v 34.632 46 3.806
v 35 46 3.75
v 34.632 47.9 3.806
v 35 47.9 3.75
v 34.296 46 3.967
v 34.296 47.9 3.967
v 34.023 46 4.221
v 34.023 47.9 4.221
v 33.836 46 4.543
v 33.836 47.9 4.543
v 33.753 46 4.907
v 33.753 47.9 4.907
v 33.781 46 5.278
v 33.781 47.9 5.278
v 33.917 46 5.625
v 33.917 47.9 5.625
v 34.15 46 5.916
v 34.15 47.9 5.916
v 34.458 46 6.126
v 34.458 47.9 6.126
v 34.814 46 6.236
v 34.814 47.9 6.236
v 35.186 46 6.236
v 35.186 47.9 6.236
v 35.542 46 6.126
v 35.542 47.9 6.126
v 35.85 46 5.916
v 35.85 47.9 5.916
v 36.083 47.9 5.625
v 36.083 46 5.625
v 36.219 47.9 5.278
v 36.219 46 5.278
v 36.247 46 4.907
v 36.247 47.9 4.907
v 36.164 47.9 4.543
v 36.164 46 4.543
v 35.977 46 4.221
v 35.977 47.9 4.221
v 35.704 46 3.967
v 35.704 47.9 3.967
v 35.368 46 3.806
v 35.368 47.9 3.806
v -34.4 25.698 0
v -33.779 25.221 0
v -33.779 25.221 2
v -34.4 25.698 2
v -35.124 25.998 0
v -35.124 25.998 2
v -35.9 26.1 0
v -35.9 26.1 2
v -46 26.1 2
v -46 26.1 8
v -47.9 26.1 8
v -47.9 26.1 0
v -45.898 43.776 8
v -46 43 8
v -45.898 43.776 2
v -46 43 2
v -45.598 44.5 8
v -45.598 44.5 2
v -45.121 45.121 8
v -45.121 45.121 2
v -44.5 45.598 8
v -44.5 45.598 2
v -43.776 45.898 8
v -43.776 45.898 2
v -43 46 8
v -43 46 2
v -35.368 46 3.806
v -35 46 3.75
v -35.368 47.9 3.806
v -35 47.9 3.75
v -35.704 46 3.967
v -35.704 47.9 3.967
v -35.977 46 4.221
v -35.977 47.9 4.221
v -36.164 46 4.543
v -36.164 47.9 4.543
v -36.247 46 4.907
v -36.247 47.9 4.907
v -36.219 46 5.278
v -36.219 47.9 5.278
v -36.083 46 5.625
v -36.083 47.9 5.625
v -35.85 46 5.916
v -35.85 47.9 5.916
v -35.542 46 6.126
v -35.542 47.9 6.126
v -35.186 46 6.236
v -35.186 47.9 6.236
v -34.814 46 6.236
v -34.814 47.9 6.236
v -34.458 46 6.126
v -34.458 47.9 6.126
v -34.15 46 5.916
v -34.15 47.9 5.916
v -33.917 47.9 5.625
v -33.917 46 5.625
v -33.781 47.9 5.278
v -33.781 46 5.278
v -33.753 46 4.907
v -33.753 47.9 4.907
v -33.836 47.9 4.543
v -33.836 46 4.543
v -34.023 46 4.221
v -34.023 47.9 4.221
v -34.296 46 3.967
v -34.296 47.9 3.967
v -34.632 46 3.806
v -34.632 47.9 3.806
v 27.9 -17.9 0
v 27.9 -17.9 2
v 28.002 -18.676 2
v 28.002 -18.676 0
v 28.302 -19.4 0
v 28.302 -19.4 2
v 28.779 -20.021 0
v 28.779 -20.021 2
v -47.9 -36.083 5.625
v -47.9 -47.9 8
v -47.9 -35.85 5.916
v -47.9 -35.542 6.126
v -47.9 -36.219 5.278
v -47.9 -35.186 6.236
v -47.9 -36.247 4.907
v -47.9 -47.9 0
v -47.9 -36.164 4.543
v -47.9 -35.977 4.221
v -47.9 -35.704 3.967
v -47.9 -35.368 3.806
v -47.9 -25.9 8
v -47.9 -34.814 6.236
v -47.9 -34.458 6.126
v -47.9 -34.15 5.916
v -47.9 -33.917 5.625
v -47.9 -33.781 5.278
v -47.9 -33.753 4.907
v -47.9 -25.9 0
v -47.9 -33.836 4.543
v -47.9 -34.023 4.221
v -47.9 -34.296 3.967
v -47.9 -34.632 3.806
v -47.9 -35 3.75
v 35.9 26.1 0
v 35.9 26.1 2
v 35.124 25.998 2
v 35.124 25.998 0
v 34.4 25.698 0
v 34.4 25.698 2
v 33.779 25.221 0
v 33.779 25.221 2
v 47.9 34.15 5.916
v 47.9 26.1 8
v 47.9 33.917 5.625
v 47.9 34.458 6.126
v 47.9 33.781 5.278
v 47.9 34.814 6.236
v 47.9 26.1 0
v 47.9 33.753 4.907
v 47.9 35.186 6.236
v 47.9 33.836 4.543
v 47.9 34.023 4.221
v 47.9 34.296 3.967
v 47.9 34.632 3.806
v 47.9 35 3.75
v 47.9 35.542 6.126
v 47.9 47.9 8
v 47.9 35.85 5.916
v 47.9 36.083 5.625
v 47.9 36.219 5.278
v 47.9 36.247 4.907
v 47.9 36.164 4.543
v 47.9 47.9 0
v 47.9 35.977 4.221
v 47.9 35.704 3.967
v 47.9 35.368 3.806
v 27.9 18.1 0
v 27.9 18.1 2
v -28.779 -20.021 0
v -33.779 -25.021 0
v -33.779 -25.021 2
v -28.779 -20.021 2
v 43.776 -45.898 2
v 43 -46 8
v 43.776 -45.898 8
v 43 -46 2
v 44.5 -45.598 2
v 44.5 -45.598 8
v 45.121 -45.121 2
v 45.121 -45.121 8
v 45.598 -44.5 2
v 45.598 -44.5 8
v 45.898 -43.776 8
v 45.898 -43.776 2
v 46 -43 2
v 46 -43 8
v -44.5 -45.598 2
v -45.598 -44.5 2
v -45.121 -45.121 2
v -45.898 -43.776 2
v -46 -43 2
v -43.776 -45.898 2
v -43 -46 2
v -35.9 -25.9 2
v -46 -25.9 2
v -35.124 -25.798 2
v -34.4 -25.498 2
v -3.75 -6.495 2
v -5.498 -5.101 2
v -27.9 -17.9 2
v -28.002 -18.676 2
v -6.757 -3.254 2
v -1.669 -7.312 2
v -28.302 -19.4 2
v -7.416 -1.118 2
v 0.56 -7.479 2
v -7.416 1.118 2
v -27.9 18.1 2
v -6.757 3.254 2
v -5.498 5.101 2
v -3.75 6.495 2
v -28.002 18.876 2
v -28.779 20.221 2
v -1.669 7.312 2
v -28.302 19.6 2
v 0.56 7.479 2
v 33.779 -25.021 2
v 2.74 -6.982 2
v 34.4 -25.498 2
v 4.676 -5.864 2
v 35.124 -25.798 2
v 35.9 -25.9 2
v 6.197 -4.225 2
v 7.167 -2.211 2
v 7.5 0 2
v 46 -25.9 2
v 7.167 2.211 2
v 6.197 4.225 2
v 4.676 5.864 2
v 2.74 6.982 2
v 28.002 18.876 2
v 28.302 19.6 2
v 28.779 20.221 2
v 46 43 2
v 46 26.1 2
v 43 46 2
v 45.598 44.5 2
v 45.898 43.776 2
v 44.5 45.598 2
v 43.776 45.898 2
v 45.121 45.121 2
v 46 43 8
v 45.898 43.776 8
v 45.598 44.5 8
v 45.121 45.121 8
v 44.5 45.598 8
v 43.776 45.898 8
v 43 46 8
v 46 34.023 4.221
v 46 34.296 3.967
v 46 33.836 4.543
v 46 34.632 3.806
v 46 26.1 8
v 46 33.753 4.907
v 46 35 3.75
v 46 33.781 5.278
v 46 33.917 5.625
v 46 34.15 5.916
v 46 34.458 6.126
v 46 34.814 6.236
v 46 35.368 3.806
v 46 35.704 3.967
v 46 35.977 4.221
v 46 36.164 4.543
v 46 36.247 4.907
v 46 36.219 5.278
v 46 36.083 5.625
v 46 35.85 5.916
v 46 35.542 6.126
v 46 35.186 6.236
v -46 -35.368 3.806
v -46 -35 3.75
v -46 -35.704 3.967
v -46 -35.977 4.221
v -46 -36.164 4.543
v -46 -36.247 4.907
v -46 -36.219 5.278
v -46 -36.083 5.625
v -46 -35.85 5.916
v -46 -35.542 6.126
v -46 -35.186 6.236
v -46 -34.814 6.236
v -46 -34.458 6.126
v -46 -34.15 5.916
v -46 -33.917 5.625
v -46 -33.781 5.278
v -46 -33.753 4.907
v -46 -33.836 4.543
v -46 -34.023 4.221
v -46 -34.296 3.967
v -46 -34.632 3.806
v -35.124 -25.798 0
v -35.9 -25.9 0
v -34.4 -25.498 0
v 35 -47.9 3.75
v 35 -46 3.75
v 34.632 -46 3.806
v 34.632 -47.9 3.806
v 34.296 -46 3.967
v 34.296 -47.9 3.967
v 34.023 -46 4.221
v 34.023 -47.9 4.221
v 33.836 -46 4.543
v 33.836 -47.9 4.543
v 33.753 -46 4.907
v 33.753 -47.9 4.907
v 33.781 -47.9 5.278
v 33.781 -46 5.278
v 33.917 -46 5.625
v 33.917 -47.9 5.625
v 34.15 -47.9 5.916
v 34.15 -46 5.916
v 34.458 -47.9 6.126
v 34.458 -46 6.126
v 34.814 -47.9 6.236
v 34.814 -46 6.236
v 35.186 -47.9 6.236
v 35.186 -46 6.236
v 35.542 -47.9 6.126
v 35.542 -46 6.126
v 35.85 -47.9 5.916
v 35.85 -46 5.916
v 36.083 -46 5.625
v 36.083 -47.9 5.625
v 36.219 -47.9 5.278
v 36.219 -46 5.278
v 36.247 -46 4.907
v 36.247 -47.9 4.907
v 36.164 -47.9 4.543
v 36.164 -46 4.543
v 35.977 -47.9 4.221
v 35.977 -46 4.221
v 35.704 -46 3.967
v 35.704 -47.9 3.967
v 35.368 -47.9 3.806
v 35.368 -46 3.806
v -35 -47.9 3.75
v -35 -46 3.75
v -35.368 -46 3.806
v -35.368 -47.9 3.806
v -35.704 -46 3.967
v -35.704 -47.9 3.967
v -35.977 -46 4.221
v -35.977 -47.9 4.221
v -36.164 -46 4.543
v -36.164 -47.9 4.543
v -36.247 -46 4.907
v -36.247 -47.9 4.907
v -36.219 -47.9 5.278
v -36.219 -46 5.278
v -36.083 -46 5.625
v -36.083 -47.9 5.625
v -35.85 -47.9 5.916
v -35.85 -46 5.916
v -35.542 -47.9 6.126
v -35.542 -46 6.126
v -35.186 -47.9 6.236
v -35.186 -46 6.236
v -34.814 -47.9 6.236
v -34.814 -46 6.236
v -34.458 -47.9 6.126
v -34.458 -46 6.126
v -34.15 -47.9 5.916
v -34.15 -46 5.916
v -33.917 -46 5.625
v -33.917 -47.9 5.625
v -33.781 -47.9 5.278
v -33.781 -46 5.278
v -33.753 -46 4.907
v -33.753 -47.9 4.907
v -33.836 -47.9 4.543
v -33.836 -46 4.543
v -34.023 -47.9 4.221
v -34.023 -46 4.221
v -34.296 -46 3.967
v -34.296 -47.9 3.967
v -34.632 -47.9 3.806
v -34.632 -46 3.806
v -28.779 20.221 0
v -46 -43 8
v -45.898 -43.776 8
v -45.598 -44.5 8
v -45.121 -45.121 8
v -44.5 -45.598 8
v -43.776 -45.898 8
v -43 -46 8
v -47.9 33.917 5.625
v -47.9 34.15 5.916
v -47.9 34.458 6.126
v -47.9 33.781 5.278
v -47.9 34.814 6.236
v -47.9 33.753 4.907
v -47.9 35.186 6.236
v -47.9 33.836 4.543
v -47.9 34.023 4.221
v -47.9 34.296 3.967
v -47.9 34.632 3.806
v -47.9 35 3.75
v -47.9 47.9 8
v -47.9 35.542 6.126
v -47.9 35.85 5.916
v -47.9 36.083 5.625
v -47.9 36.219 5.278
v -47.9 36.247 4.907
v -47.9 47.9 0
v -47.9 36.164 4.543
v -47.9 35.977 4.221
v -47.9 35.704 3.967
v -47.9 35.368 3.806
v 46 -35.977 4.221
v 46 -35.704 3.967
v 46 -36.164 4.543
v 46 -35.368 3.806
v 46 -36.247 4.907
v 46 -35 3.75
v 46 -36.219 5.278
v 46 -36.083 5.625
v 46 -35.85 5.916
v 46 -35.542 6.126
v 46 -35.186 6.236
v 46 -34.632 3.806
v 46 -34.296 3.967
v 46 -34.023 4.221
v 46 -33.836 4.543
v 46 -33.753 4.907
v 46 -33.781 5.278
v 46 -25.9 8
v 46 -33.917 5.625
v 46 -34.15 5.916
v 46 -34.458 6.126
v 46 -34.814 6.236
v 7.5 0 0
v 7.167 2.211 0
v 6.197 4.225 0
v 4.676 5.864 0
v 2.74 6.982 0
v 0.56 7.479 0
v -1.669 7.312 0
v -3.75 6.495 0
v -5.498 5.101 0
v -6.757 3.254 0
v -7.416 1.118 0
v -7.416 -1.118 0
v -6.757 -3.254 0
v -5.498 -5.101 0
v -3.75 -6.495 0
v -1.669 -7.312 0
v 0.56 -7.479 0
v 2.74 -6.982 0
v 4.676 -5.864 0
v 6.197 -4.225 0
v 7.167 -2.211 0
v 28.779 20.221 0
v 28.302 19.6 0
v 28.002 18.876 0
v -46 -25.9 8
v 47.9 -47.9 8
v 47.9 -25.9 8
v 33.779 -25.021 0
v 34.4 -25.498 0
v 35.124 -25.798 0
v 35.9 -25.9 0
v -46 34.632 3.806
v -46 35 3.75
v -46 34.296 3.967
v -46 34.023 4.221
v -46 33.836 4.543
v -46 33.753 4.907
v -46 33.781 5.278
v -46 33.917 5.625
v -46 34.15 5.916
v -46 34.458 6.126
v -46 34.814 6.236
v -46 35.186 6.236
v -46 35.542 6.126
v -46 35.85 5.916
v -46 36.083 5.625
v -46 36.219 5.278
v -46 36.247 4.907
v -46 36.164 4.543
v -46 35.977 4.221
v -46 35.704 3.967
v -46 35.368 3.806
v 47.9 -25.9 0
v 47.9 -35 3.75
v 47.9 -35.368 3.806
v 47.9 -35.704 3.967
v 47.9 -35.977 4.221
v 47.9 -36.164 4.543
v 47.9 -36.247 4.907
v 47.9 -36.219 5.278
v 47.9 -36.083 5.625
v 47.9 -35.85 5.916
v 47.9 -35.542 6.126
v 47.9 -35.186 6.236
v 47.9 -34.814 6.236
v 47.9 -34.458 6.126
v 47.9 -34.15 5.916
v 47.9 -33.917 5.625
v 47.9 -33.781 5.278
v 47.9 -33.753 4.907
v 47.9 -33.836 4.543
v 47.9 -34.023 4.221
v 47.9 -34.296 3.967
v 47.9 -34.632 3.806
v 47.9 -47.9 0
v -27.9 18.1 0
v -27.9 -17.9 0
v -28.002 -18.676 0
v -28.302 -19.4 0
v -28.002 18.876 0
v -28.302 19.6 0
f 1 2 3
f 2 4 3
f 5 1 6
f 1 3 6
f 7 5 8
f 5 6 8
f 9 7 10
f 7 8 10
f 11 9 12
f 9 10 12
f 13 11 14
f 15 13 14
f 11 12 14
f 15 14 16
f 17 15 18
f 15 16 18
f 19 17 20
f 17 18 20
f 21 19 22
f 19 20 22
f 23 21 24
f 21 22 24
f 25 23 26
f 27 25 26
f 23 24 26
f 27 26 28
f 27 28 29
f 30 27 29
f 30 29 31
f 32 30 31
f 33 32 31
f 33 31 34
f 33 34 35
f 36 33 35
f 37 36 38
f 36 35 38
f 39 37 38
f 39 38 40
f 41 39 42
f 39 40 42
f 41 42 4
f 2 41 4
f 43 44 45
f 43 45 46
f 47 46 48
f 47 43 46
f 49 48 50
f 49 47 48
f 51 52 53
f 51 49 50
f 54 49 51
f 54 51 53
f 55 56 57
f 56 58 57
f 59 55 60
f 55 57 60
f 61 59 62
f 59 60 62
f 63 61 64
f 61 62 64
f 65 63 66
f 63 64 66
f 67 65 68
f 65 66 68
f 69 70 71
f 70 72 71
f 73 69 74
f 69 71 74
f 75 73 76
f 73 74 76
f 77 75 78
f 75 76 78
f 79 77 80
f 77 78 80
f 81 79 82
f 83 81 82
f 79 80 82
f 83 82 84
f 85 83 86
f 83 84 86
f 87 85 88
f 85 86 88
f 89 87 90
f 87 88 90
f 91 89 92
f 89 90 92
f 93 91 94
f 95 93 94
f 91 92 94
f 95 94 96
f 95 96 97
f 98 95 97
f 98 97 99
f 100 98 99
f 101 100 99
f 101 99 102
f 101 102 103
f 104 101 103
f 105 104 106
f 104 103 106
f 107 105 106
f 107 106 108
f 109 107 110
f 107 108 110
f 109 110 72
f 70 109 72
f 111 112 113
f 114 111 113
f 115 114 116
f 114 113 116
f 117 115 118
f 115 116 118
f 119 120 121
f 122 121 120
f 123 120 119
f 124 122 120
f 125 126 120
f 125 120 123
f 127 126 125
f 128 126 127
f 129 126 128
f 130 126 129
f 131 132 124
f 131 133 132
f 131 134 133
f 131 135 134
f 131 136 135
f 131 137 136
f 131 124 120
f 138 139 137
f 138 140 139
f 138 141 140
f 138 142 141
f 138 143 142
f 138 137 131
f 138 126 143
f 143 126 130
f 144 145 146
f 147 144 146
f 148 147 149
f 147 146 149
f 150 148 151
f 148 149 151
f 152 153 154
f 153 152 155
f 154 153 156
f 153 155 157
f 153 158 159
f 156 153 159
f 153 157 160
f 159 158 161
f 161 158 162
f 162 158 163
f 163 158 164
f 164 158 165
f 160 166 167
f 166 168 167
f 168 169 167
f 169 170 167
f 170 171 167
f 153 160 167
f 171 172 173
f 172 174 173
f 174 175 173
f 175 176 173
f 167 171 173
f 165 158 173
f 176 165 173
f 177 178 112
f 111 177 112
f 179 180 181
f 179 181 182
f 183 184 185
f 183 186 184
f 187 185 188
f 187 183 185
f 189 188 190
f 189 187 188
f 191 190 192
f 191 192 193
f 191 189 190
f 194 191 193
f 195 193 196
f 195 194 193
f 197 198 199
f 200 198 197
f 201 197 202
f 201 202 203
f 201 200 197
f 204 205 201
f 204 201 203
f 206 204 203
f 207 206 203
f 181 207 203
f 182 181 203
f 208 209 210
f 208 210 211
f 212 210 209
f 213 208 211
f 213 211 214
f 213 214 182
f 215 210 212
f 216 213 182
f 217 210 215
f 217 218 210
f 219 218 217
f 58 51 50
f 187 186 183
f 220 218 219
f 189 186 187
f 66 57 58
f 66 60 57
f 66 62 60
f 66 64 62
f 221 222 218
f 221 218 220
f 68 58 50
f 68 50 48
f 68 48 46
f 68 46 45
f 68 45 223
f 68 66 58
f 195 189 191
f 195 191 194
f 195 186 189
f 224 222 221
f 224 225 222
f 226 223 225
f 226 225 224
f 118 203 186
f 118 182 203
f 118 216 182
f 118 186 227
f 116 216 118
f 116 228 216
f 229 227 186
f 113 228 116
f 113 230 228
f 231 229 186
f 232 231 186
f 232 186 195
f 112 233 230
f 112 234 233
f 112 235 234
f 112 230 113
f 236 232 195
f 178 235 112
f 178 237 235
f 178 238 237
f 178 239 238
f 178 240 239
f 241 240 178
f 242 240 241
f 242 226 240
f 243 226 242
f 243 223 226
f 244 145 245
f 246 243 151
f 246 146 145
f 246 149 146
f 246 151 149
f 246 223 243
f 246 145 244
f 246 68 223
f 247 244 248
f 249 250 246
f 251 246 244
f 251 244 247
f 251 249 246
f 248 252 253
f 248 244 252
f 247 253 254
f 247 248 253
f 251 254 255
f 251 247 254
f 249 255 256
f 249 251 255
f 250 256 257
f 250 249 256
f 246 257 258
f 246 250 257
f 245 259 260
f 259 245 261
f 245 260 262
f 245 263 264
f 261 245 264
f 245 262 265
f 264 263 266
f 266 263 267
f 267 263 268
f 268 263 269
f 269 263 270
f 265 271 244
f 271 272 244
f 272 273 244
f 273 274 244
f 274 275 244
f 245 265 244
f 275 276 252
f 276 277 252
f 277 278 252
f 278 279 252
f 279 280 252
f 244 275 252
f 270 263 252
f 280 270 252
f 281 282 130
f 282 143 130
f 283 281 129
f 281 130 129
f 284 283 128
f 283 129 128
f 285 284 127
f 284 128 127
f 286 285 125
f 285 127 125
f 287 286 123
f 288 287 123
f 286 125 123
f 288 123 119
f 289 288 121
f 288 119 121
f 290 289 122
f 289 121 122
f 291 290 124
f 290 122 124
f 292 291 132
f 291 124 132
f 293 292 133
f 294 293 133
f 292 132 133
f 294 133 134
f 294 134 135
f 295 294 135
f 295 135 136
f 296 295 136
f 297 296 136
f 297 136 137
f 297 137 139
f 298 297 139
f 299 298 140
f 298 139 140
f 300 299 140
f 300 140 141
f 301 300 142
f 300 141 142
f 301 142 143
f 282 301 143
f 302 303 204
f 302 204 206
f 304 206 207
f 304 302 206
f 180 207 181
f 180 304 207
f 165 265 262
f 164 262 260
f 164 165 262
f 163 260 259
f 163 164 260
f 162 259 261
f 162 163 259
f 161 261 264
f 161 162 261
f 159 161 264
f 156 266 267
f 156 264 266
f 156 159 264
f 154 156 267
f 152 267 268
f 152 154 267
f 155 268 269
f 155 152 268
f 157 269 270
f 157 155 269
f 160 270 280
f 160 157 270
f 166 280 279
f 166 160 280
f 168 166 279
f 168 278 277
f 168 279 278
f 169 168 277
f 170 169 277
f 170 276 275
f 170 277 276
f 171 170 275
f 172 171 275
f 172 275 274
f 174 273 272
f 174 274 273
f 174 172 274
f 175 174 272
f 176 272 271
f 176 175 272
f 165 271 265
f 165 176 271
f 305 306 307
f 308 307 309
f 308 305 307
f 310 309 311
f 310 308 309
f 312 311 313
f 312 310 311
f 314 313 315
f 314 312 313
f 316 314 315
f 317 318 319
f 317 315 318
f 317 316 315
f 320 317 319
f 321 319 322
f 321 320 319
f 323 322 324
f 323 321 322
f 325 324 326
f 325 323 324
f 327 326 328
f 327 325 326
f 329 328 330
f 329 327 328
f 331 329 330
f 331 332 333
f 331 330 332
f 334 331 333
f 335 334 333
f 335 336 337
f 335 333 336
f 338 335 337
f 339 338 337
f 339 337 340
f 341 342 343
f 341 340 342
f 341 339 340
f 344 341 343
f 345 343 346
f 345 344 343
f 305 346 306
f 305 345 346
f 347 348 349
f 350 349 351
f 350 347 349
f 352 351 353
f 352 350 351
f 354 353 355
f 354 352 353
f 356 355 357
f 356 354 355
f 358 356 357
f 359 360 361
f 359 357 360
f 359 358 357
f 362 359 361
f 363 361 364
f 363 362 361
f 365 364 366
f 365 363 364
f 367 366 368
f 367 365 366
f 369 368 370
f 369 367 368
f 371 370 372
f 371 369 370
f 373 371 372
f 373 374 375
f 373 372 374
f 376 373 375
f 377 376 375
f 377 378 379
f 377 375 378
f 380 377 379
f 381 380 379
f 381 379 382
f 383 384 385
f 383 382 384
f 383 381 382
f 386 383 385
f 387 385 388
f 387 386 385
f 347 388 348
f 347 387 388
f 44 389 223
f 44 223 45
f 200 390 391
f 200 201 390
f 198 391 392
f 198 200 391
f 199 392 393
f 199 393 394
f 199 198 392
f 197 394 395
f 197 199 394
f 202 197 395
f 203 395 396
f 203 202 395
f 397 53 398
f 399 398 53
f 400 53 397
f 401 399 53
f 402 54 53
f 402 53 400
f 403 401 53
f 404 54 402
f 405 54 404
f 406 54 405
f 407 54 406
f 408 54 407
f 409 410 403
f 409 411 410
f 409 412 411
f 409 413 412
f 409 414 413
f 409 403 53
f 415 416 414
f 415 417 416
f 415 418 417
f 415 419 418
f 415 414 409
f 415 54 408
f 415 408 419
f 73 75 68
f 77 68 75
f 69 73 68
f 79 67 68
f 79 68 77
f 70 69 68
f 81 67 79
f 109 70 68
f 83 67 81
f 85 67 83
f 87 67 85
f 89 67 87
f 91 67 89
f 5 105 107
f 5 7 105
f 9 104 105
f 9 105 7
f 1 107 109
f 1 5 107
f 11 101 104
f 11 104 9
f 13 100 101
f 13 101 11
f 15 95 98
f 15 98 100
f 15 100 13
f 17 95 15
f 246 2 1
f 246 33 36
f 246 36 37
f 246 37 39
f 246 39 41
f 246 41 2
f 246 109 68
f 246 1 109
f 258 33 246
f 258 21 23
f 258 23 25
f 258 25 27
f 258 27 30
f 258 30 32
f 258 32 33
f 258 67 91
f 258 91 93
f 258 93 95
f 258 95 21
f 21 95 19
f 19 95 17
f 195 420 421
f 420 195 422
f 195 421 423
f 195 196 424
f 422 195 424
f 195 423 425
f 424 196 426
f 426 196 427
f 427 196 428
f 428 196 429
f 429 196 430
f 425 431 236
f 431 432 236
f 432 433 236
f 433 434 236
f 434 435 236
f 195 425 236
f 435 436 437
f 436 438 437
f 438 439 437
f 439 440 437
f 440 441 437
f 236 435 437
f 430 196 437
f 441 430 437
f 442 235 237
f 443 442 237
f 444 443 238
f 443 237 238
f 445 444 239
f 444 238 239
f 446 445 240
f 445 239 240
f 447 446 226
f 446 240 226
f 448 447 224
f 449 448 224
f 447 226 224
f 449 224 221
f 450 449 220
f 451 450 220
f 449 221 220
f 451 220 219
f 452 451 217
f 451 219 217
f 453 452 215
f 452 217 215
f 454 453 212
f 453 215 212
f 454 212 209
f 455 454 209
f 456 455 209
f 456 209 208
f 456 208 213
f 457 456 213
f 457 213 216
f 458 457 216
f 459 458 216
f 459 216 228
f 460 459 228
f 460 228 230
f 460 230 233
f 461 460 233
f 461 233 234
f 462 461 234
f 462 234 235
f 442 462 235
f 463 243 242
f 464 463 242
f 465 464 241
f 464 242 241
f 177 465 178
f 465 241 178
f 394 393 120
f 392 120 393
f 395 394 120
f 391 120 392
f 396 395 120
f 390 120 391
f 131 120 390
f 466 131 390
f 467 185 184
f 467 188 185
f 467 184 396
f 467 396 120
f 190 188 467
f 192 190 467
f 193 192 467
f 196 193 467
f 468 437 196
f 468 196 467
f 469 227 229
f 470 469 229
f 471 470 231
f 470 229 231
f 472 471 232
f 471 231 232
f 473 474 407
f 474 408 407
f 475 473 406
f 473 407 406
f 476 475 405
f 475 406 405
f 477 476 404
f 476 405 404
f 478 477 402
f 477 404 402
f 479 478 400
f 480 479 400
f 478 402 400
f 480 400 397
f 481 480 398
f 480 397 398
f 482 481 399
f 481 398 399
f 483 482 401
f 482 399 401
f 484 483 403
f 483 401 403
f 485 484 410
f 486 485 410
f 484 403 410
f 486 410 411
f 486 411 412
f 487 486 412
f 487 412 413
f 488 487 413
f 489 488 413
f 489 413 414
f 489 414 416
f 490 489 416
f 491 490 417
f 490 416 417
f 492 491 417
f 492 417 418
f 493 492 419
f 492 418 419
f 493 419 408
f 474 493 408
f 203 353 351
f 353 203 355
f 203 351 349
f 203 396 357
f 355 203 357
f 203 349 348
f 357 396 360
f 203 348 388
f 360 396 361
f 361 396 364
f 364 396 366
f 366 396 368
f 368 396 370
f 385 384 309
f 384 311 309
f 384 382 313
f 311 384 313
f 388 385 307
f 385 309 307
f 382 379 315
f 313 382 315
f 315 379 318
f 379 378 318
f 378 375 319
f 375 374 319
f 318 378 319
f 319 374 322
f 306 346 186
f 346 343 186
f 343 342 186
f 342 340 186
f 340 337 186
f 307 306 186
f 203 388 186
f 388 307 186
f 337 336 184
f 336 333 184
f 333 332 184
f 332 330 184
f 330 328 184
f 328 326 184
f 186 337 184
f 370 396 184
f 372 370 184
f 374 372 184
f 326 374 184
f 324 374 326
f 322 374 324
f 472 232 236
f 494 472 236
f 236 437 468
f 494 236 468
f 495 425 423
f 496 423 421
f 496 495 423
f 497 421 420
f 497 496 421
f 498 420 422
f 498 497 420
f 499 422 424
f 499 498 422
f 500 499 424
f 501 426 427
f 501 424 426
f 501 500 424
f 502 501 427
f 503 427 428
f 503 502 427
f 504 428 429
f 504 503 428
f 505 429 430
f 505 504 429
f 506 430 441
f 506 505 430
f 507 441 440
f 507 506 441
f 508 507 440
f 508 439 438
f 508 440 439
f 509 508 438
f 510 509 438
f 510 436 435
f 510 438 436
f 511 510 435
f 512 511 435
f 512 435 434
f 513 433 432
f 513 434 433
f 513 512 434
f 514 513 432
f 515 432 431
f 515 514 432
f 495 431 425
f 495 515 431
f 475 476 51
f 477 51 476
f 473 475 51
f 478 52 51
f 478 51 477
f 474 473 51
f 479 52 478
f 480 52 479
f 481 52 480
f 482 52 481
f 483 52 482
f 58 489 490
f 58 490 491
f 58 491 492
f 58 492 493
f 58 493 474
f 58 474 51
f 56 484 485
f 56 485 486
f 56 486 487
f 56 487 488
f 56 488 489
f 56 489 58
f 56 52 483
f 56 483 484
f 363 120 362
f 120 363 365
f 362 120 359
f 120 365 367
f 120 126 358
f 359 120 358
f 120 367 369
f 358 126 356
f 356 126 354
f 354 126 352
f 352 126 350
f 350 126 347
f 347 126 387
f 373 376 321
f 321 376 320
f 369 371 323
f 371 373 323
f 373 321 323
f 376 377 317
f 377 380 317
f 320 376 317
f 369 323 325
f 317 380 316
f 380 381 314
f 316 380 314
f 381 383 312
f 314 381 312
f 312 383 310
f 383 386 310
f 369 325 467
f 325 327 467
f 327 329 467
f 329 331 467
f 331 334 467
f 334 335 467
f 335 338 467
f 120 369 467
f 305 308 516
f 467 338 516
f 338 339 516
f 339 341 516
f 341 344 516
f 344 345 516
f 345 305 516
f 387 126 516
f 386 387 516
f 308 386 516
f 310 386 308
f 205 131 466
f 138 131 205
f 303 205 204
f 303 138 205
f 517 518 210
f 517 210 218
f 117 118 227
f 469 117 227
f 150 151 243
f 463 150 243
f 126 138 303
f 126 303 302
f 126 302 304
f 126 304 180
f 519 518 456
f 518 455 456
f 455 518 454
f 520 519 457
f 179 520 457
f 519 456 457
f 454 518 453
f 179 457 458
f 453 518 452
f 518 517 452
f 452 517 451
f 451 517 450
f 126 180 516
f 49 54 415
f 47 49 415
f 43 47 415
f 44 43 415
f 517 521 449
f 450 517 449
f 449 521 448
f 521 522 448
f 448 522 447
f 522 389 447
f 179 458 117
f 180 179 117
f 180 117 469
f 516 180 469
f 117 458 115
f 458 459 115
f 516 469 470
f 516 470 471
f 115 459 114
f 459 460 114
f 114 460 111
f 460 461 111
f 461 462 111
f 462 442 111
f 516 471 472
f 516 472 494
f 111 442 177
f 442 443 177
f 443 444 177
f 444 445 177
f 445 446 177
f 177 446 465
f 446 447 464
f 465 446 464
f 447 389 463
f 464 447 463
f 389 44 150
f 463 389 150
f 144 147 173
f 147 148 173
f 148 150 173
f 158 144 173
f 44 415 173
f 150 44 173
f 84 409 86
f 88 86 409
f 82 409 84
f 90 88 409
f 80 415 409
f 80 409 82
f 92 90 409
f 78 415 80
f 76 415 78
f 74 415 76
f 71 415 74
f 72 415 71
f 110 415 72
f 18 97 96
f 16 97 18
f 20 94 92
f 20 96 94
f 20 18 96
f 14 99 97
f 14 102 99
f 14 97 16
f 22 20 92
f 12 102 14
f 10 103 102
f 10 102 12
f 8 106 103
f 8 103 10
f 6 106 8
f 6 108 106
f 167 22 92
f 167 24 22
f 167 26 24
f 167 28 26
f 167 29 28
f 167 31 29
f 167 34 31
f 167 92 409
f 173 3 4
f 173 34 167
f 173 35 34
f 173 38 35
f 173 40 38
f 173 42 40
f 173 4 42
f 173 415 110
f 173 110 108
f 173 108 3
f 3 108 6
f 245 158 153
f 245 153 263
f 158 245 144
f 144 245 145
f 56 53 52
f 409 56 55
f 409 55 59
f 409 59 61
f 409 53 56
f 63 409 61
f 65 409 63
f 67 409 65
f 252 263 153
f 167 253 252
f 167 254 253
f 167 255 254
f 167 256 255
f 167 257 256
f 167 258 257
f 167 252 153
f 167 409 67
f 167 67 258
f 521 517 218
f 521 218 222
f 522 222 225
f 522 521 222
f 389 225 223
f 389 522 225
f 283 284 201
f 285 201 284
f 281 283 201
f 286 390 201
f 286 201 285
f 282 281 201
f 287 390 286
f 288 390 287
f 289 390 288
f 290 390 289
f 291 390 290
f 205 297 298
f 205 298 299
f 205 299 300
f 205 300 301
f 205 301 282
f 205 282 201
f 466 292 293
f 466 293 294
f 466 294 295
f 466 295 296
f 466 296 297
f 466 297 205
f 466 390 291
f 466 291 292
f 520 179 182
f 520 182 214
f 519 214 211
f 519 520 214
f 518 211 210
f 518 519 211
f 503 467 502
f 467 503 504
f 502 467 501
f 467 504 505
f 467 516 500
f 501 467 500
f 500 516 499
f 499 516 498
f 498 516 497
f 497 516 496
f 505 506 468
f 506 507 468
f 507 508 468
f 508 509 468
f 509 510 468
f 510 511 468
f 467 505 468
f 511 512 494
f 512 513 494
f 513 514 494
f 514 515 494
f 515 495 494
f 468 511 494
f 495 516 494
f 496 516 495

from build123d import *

# Parameters (mm, degrees)
SKETCH1_W                      = 95.8
SKETCH1_H                      = 95.8
BOSS_EXTRUDE1_DEPTH            = 8
SKETCH2_W                      = 92
SKETCH2_H                      = 92
COMPONENT_PLATFORM_DEPTH       = 6
CABLE_SLOTS_DEPTH              = 6
SKETCH4_R                      = 7.5
CENTER_MASS_CUT_DEPTH          = 6
INNER_CORNER_FILLETS_R         = 3
M3X0_5_TAPPED_HOLE1_AT_2_COUNT = 2
M3X0_5_TAPPED_HOLE1_AT_2_PITCH = 70
M3X0_5_TAPPED_HOLE2_AT_2_COUNT = 2
M3X0_5_TAPPED_HOLE2_AT_2_PITCH = 70


with BuildPart() as part:
    # Sketch1 → Boss-Extrude1 (new body)
    with BuildSketch(Plane.XY):
        Rectangle(SKETCH1_W, SKETCH1_H)
    extrude(amount=BOSS_EXTRUDE1_DEPTH)

    # Sketch2 → Component Platform (cut)
    with BuildSketch(Plane.XY.offset(8)):
        Rectangle(SKETCH2_W, SKETCH2_H)
    extrude(amount=-COMPONENT_PLATFORM_DEPTH, mode=Mode.SUBTRACT)

    # Sketch3 → Cable Slots (cut, symmetric)
    with BuildSketch(Plane.XY.offset(2)):
        with BuildLine():
            Line((-33.778679656, -25.021320344), (-28.778679656, -20.021320344))
            ThreePointArc((-28.778679656, -20.021320344), (-28.128361402, -19.048050297), (-27.9, -17.9))
            Line((-27.9, -17.9), (-27.9, 18.1))
            ThreePointArc((-27.9, 18.1), (-28.128361402, 19.248050297), (-28.778679656, 20.221320344))
            Line((-28.778679656, 20.221320344), (-33.778679656, 25.221320344))
            ThreePointArc((-33.778679656, 25.221320344), (-34.751949703, 25.871638598), (-35.9, 26.1))
            Line((-35.9, 26.1), (-47.9, 26.1))
            Line((-47.9, 26.1), (-47.9, -25.9))
            Line((-47.9, -25.9), (-35.9, -25.9))
            ThreePointArc((-35.9, -25.9), (-34.751949703, -25.671638598), (-33.778679656, -25.021320344))
        make_face()
        with BuildLine():
            Line((47.9, -25.9), (47.9, 26.1))
            Line((47.9, 26.1), (35.9, 26.1))
            ThreePointArc((35.9, 26.1), (34.751949703, 25.871638598), (33.778679656, 25.221320344))
            Line((33.778679656, 25.221320344), (28.778679656, 20.221320344))
            ThreePointArc((28.778679656, 20.221320344), (28.128361402, 19.248050297), (27.9, 18.1))
            Line((27.9, 18.1), (27.9, -17.9))
            ThreePointArc((27.9, -17.9), (28.128361402, -19.048050297), (28.778679656, -20.021320344))
            Line((28.778679656, -20.021320344), (33.778679656, -25.021320344))
            ThreePointArc((33.778679656, -25.021320344), (34.751949703, -25.671638598), (35.9, -25.9))
            Line((35.9, -25.9), (47.9, -25.9))
        make_face()
    extrude(amount=CABLE_SLOTS_DEPTH, both=True, mode=Mode.SUBTRACT)

    # Sketch4 → Center Mass Cut (cut)
    with BuildSketch(Plane.XY.offset(2)):
        Circle(SKETCH4_R)
    extrude(amount=-CENTER_MASS_CUT_DEPTH, mode=Mode.SUBTRACT)

    # Inner Corner Fillets
    inner_corner_fillets_edges = [part.edges().sort_by_distance(p)[0] for p in [
        (-46, -46, 5),
        (-46, 46, 5),
        (46, 46, 5),
        (46, -46, 5),
    ]]
    fillet(inner_corner_fillets_edges, radius=INNER_CORNER_FILLETS_R)

    # Sketch10 → M3x0.5 Tapped Hole1 (revolve, cut)
    with BuildSketch(Plane(origin=(47.9, -35, 5), x_dir=(0, 0, -1), z_dir=(0, 1, 0))):
        Polygon((0, 0), (0, 10.751075774), (1.25, 10), (1.25, 0), align=None)
    m3x0_5_tapped_hole1 = revolve(axis=Axis((54.25, -35, 5), (-1, 0, 0)), mode=Mode.SUBTRACT)

    # M3x0.5 Tapped Hole1 at 2: M3x0.5 Tapped Hole1 ×2
    with Locations(*[(0, i * M3X0_5_TAPPED_HOLE1_AT_2_PITCH, 0) for i in range(1, M3X0_5_TAPPED_HOLE1_AT_2_COUNT)]):
        add(m3x0_5_tapped_hole1, mode=Mode.SUBTRACT)

    # Sketch13 → M3x0.5 Tapped Hole2 (revolve, cut)
    with BuildSketch(Plane(origin=(-35, -47.9, 5), x_dir=(0, 0, -1), z_dir=(1, 0, 0))):
        Polygon((0, 0), (0, 10.751075774), (1.25, 10), (1.25, 0), align=None)
    m3x0_5_tapped_hole2 = revolve(axis=Axis((-35, -54.25, 5), (0, 1, 0)), mode=Mode.SUBTRACT)

    # M3x0.5 Tapped Hole2 at 2: M3x0.5 Tapped Hole2 ×2
    with Locations(*[(i * M3X0_5_TAPPED_HOLE2_AT_2_PITCH, 0, 0) for i in range(1, M3X0_5_TAPPED_HOLE2_AT_2_COUNT)]):
        add(m3x0_5_tapped_hole2, mode=Mode.SUBTRACT)

    # Mirror1: M3x0.5 Tapped Hole1 across plane
    add(m3x0_5_tapped_hole1.mirror(Plane(origin=(-0.1, 0, 0), x_dir=(0, 0, 1), z_dir=(1, 0, 0))), mode=Mode.SUBTRACT)

    # Mirror1 copy 1 sketch → Mirror1 copy 1 (revolve, cut)
    with BuildSketch(Plane(origin=(-48.1, 35, 5), x_dir=(0, 0, -1), z_dir=(0, 1, 0))):
        Polygon((0, 0), (0, -10.751075774), (1.25, -10), (1.25, 0), align=None)
    revolve(axis=Axis((-54.45, 35, 5), (-1, 0, 0)), mode=Mode.SUBTRACT)

    # Mirror2: M3x0.5 Tapped Hole2 across plane
    add(m3x0_5_tapped_hole2.mirror(Plane(origin=(0, 0.1, 0), x_dir=(0, 0, 1), z_dir=(0, -1, 0))), mode=Mode.SUBTRACT)

    # Mirror2 copy 1 sketch → Mirror2 copy 1 (revolve, cut)
    with BuildSketch(Plane(origin=(35, 48.1, 5), x_dir=(0, 0, -1), z_dir=(1, 0, 0))):
        Polygon((0, 0), (0, -10.751075774), (1.25, -10), (1.25, 0), align=None)
    revolve(axis=Axis((35, 54.45, 5), (0, 1, 0)), mode=Mode.SUBTRACT)


solid = part.part
